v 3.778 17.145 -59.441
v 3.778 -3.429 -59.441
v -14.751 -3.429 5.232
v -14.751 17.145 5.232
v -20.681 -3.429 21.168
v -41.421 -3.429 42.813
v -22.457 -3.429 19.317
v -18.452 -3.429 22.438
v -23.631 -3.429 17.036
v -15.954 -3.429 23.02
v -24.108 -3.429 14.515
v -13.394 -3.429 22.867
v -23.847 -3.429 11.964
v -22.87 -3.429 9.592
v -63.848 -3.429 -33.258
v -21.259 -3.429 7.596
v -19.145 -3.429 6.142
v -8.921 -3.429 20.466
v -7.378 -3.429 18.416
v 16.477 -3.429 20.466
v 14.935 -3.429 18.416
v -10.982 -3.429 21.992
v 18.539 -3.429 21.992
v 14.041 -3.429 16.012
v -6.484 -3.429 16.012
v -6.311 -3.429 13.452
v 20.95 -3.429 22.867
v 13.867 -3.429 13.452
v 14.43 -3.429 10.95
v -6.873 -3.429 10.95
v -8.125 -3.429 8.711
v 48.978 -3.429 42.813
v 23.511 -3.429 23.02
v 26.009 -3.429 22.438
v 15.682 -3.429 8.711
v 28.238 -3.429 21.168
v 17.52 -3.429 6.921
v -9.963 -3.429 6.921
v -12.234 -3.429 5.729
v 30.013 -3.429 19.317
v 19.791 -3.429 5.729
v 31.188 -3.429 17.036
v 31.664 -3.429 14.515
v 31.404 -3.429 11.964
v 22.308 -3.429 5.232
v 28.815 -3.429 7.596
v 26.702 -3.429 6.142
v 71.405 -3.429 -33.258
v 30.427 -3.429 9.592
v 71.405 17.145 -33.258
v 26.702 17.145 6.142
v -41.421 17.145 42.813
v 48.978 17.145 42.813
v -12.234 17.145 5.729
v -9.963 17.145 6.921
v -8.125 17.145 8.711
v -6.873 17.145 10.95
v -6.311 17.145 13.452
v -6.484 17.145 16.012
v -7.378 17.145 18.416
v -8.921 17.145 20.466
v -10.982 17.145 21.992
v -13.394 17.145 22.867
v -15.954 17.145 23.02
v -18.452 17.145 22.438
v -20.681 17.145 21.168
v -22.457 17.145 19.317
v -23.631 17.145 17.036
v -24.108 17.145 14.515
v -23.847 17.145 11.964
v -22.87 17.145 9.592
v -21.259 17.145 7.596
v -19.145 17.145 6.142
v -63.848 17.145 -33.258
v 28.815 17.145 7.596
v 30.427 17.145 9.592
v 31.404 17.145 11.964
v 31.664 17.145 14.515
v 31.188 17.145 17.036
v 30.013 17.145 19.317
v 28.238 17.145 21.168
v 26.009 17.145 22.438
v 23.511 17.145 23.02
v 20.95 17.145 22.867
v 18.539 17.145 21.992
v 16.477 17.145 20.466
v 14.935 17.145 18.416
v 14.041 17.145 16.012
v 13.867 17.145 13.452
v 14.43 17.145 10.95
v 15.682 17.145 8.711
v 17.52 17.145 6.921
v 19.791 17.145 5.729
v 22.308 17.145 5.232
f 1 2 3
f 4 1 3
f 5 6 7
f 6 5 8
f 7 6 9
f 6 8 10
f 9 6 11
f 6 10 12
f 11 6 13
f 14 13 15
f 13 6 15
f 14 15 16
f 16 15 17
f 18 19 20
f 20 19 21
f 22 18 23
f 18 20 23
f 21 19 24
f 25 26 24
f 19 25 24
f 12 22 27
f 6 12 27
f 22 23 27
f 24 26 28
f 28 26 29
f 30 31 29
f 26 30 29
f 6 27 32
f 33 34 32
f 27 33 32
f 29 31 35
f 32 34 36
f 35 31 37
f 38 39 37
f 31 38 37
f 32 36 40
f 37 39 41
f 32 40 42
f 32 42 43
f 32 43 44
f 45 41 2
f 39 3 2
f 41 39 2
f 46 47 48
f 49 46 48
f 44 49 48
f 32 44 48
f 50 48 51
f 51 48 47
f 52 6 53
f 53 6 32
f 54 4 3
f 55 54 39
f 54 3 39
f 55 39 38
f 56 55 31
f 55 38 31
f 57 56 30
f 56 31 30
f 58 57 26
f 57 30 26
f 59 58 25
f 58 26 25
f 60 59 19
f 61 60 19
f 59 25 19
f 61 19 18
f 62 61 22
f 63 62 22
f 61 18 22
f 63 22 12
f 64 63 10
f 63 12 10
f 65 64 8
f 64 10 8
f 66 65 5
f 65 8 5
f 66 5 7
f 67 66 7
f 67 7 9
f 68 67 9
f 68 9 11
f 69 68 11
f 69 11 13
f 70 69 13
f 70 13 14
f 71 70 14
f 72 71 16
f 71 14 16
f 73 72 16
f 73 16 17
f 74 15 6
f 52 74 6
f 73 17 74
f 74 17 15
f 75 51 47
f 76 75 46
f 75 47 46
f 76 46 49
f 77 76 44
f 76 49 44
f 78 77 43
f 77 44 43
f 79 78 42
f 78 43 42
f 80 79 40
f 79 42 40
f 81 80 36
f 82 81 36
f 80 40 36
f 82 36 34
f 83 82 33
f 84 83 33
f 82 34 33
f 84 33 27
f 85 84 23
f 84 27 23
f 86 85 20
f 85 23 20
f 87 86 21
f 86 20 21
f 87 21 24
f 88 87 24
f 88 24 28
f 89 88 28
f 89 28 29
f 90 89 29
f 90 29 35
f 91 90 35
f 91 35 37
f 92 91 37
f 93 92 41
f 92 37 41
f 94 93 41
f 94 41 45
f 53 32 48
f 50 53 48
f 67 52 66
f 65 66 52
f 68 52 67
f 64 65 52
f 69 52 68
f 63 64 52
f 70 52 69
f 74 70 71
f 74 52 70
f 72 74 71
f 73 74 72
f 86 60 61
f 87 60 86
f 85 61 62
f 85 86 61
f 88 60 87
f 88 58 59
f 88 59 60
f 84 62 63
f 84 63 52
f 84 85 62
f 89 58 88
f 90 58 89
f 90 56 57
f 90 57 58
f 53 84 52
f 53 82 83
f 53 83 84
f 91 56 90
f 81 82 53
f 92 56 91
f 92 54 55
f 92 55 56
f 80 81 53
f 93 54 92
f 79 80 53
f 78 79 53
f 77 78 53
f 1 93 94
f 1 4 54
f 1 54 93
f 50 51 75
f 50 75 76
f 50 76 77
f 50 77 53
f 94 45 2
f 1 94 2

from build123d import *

# Parameters (mm, degrees)
BOSS_EXTRUDE1_DEPTH = 13.716
SCALE1_SCALE        = 1.5


with BuildPart() as part:
    # Sketch1 → Boss-Extrude1 (new body)
    with BuildSketch(Plane(origin=(0, 0, 0), x_dir=(1, 0, 0), z_dir=(0, 1, 0))):
        with BuildLine():
            Line((33.911483948, -31.607658541), (48.863023265, 19.10634644))
            Line((48.863023265, 19.10634644), (19.060968545, -7.15987128))
            ThreePointArc((19.060968545, -7.15987128), (15.22639693, -18.310469683), (16.13127503, -6.553727794))
            Line((16.13127503, -6.553727794), (3.778414078, 36.56159637))
            Line((3.778414078, 36.56159637), (-8.574446874, -6.553727794))
            ThreePointArc((-8.574446874, -6.553727794), (-7.669568774, -18.310469683), (-11.504140389, -7.15987128))
            Line((-11.504140389, -7.15987128), (-41.306195109, 19.10634644))
            Line((-41.306195109, 19.10634644), (-26.354655792, -31.607658541))
            Line((-26.354655792, -31.607658541), (33.911483948, -31.607658541))
        make_face()
    extrude(amount=BOSS_EXTRUDE1_DEPTH)


with BuildPart() as part_1:
    # Scale1: scaled about (3.778414078, 6.858, 9.196569952)
    add(part.part.scale(SCALE1_SCALE).moved(Location((-1.889207039, -3.429, -4.598284976))))


solid = part_1.part
